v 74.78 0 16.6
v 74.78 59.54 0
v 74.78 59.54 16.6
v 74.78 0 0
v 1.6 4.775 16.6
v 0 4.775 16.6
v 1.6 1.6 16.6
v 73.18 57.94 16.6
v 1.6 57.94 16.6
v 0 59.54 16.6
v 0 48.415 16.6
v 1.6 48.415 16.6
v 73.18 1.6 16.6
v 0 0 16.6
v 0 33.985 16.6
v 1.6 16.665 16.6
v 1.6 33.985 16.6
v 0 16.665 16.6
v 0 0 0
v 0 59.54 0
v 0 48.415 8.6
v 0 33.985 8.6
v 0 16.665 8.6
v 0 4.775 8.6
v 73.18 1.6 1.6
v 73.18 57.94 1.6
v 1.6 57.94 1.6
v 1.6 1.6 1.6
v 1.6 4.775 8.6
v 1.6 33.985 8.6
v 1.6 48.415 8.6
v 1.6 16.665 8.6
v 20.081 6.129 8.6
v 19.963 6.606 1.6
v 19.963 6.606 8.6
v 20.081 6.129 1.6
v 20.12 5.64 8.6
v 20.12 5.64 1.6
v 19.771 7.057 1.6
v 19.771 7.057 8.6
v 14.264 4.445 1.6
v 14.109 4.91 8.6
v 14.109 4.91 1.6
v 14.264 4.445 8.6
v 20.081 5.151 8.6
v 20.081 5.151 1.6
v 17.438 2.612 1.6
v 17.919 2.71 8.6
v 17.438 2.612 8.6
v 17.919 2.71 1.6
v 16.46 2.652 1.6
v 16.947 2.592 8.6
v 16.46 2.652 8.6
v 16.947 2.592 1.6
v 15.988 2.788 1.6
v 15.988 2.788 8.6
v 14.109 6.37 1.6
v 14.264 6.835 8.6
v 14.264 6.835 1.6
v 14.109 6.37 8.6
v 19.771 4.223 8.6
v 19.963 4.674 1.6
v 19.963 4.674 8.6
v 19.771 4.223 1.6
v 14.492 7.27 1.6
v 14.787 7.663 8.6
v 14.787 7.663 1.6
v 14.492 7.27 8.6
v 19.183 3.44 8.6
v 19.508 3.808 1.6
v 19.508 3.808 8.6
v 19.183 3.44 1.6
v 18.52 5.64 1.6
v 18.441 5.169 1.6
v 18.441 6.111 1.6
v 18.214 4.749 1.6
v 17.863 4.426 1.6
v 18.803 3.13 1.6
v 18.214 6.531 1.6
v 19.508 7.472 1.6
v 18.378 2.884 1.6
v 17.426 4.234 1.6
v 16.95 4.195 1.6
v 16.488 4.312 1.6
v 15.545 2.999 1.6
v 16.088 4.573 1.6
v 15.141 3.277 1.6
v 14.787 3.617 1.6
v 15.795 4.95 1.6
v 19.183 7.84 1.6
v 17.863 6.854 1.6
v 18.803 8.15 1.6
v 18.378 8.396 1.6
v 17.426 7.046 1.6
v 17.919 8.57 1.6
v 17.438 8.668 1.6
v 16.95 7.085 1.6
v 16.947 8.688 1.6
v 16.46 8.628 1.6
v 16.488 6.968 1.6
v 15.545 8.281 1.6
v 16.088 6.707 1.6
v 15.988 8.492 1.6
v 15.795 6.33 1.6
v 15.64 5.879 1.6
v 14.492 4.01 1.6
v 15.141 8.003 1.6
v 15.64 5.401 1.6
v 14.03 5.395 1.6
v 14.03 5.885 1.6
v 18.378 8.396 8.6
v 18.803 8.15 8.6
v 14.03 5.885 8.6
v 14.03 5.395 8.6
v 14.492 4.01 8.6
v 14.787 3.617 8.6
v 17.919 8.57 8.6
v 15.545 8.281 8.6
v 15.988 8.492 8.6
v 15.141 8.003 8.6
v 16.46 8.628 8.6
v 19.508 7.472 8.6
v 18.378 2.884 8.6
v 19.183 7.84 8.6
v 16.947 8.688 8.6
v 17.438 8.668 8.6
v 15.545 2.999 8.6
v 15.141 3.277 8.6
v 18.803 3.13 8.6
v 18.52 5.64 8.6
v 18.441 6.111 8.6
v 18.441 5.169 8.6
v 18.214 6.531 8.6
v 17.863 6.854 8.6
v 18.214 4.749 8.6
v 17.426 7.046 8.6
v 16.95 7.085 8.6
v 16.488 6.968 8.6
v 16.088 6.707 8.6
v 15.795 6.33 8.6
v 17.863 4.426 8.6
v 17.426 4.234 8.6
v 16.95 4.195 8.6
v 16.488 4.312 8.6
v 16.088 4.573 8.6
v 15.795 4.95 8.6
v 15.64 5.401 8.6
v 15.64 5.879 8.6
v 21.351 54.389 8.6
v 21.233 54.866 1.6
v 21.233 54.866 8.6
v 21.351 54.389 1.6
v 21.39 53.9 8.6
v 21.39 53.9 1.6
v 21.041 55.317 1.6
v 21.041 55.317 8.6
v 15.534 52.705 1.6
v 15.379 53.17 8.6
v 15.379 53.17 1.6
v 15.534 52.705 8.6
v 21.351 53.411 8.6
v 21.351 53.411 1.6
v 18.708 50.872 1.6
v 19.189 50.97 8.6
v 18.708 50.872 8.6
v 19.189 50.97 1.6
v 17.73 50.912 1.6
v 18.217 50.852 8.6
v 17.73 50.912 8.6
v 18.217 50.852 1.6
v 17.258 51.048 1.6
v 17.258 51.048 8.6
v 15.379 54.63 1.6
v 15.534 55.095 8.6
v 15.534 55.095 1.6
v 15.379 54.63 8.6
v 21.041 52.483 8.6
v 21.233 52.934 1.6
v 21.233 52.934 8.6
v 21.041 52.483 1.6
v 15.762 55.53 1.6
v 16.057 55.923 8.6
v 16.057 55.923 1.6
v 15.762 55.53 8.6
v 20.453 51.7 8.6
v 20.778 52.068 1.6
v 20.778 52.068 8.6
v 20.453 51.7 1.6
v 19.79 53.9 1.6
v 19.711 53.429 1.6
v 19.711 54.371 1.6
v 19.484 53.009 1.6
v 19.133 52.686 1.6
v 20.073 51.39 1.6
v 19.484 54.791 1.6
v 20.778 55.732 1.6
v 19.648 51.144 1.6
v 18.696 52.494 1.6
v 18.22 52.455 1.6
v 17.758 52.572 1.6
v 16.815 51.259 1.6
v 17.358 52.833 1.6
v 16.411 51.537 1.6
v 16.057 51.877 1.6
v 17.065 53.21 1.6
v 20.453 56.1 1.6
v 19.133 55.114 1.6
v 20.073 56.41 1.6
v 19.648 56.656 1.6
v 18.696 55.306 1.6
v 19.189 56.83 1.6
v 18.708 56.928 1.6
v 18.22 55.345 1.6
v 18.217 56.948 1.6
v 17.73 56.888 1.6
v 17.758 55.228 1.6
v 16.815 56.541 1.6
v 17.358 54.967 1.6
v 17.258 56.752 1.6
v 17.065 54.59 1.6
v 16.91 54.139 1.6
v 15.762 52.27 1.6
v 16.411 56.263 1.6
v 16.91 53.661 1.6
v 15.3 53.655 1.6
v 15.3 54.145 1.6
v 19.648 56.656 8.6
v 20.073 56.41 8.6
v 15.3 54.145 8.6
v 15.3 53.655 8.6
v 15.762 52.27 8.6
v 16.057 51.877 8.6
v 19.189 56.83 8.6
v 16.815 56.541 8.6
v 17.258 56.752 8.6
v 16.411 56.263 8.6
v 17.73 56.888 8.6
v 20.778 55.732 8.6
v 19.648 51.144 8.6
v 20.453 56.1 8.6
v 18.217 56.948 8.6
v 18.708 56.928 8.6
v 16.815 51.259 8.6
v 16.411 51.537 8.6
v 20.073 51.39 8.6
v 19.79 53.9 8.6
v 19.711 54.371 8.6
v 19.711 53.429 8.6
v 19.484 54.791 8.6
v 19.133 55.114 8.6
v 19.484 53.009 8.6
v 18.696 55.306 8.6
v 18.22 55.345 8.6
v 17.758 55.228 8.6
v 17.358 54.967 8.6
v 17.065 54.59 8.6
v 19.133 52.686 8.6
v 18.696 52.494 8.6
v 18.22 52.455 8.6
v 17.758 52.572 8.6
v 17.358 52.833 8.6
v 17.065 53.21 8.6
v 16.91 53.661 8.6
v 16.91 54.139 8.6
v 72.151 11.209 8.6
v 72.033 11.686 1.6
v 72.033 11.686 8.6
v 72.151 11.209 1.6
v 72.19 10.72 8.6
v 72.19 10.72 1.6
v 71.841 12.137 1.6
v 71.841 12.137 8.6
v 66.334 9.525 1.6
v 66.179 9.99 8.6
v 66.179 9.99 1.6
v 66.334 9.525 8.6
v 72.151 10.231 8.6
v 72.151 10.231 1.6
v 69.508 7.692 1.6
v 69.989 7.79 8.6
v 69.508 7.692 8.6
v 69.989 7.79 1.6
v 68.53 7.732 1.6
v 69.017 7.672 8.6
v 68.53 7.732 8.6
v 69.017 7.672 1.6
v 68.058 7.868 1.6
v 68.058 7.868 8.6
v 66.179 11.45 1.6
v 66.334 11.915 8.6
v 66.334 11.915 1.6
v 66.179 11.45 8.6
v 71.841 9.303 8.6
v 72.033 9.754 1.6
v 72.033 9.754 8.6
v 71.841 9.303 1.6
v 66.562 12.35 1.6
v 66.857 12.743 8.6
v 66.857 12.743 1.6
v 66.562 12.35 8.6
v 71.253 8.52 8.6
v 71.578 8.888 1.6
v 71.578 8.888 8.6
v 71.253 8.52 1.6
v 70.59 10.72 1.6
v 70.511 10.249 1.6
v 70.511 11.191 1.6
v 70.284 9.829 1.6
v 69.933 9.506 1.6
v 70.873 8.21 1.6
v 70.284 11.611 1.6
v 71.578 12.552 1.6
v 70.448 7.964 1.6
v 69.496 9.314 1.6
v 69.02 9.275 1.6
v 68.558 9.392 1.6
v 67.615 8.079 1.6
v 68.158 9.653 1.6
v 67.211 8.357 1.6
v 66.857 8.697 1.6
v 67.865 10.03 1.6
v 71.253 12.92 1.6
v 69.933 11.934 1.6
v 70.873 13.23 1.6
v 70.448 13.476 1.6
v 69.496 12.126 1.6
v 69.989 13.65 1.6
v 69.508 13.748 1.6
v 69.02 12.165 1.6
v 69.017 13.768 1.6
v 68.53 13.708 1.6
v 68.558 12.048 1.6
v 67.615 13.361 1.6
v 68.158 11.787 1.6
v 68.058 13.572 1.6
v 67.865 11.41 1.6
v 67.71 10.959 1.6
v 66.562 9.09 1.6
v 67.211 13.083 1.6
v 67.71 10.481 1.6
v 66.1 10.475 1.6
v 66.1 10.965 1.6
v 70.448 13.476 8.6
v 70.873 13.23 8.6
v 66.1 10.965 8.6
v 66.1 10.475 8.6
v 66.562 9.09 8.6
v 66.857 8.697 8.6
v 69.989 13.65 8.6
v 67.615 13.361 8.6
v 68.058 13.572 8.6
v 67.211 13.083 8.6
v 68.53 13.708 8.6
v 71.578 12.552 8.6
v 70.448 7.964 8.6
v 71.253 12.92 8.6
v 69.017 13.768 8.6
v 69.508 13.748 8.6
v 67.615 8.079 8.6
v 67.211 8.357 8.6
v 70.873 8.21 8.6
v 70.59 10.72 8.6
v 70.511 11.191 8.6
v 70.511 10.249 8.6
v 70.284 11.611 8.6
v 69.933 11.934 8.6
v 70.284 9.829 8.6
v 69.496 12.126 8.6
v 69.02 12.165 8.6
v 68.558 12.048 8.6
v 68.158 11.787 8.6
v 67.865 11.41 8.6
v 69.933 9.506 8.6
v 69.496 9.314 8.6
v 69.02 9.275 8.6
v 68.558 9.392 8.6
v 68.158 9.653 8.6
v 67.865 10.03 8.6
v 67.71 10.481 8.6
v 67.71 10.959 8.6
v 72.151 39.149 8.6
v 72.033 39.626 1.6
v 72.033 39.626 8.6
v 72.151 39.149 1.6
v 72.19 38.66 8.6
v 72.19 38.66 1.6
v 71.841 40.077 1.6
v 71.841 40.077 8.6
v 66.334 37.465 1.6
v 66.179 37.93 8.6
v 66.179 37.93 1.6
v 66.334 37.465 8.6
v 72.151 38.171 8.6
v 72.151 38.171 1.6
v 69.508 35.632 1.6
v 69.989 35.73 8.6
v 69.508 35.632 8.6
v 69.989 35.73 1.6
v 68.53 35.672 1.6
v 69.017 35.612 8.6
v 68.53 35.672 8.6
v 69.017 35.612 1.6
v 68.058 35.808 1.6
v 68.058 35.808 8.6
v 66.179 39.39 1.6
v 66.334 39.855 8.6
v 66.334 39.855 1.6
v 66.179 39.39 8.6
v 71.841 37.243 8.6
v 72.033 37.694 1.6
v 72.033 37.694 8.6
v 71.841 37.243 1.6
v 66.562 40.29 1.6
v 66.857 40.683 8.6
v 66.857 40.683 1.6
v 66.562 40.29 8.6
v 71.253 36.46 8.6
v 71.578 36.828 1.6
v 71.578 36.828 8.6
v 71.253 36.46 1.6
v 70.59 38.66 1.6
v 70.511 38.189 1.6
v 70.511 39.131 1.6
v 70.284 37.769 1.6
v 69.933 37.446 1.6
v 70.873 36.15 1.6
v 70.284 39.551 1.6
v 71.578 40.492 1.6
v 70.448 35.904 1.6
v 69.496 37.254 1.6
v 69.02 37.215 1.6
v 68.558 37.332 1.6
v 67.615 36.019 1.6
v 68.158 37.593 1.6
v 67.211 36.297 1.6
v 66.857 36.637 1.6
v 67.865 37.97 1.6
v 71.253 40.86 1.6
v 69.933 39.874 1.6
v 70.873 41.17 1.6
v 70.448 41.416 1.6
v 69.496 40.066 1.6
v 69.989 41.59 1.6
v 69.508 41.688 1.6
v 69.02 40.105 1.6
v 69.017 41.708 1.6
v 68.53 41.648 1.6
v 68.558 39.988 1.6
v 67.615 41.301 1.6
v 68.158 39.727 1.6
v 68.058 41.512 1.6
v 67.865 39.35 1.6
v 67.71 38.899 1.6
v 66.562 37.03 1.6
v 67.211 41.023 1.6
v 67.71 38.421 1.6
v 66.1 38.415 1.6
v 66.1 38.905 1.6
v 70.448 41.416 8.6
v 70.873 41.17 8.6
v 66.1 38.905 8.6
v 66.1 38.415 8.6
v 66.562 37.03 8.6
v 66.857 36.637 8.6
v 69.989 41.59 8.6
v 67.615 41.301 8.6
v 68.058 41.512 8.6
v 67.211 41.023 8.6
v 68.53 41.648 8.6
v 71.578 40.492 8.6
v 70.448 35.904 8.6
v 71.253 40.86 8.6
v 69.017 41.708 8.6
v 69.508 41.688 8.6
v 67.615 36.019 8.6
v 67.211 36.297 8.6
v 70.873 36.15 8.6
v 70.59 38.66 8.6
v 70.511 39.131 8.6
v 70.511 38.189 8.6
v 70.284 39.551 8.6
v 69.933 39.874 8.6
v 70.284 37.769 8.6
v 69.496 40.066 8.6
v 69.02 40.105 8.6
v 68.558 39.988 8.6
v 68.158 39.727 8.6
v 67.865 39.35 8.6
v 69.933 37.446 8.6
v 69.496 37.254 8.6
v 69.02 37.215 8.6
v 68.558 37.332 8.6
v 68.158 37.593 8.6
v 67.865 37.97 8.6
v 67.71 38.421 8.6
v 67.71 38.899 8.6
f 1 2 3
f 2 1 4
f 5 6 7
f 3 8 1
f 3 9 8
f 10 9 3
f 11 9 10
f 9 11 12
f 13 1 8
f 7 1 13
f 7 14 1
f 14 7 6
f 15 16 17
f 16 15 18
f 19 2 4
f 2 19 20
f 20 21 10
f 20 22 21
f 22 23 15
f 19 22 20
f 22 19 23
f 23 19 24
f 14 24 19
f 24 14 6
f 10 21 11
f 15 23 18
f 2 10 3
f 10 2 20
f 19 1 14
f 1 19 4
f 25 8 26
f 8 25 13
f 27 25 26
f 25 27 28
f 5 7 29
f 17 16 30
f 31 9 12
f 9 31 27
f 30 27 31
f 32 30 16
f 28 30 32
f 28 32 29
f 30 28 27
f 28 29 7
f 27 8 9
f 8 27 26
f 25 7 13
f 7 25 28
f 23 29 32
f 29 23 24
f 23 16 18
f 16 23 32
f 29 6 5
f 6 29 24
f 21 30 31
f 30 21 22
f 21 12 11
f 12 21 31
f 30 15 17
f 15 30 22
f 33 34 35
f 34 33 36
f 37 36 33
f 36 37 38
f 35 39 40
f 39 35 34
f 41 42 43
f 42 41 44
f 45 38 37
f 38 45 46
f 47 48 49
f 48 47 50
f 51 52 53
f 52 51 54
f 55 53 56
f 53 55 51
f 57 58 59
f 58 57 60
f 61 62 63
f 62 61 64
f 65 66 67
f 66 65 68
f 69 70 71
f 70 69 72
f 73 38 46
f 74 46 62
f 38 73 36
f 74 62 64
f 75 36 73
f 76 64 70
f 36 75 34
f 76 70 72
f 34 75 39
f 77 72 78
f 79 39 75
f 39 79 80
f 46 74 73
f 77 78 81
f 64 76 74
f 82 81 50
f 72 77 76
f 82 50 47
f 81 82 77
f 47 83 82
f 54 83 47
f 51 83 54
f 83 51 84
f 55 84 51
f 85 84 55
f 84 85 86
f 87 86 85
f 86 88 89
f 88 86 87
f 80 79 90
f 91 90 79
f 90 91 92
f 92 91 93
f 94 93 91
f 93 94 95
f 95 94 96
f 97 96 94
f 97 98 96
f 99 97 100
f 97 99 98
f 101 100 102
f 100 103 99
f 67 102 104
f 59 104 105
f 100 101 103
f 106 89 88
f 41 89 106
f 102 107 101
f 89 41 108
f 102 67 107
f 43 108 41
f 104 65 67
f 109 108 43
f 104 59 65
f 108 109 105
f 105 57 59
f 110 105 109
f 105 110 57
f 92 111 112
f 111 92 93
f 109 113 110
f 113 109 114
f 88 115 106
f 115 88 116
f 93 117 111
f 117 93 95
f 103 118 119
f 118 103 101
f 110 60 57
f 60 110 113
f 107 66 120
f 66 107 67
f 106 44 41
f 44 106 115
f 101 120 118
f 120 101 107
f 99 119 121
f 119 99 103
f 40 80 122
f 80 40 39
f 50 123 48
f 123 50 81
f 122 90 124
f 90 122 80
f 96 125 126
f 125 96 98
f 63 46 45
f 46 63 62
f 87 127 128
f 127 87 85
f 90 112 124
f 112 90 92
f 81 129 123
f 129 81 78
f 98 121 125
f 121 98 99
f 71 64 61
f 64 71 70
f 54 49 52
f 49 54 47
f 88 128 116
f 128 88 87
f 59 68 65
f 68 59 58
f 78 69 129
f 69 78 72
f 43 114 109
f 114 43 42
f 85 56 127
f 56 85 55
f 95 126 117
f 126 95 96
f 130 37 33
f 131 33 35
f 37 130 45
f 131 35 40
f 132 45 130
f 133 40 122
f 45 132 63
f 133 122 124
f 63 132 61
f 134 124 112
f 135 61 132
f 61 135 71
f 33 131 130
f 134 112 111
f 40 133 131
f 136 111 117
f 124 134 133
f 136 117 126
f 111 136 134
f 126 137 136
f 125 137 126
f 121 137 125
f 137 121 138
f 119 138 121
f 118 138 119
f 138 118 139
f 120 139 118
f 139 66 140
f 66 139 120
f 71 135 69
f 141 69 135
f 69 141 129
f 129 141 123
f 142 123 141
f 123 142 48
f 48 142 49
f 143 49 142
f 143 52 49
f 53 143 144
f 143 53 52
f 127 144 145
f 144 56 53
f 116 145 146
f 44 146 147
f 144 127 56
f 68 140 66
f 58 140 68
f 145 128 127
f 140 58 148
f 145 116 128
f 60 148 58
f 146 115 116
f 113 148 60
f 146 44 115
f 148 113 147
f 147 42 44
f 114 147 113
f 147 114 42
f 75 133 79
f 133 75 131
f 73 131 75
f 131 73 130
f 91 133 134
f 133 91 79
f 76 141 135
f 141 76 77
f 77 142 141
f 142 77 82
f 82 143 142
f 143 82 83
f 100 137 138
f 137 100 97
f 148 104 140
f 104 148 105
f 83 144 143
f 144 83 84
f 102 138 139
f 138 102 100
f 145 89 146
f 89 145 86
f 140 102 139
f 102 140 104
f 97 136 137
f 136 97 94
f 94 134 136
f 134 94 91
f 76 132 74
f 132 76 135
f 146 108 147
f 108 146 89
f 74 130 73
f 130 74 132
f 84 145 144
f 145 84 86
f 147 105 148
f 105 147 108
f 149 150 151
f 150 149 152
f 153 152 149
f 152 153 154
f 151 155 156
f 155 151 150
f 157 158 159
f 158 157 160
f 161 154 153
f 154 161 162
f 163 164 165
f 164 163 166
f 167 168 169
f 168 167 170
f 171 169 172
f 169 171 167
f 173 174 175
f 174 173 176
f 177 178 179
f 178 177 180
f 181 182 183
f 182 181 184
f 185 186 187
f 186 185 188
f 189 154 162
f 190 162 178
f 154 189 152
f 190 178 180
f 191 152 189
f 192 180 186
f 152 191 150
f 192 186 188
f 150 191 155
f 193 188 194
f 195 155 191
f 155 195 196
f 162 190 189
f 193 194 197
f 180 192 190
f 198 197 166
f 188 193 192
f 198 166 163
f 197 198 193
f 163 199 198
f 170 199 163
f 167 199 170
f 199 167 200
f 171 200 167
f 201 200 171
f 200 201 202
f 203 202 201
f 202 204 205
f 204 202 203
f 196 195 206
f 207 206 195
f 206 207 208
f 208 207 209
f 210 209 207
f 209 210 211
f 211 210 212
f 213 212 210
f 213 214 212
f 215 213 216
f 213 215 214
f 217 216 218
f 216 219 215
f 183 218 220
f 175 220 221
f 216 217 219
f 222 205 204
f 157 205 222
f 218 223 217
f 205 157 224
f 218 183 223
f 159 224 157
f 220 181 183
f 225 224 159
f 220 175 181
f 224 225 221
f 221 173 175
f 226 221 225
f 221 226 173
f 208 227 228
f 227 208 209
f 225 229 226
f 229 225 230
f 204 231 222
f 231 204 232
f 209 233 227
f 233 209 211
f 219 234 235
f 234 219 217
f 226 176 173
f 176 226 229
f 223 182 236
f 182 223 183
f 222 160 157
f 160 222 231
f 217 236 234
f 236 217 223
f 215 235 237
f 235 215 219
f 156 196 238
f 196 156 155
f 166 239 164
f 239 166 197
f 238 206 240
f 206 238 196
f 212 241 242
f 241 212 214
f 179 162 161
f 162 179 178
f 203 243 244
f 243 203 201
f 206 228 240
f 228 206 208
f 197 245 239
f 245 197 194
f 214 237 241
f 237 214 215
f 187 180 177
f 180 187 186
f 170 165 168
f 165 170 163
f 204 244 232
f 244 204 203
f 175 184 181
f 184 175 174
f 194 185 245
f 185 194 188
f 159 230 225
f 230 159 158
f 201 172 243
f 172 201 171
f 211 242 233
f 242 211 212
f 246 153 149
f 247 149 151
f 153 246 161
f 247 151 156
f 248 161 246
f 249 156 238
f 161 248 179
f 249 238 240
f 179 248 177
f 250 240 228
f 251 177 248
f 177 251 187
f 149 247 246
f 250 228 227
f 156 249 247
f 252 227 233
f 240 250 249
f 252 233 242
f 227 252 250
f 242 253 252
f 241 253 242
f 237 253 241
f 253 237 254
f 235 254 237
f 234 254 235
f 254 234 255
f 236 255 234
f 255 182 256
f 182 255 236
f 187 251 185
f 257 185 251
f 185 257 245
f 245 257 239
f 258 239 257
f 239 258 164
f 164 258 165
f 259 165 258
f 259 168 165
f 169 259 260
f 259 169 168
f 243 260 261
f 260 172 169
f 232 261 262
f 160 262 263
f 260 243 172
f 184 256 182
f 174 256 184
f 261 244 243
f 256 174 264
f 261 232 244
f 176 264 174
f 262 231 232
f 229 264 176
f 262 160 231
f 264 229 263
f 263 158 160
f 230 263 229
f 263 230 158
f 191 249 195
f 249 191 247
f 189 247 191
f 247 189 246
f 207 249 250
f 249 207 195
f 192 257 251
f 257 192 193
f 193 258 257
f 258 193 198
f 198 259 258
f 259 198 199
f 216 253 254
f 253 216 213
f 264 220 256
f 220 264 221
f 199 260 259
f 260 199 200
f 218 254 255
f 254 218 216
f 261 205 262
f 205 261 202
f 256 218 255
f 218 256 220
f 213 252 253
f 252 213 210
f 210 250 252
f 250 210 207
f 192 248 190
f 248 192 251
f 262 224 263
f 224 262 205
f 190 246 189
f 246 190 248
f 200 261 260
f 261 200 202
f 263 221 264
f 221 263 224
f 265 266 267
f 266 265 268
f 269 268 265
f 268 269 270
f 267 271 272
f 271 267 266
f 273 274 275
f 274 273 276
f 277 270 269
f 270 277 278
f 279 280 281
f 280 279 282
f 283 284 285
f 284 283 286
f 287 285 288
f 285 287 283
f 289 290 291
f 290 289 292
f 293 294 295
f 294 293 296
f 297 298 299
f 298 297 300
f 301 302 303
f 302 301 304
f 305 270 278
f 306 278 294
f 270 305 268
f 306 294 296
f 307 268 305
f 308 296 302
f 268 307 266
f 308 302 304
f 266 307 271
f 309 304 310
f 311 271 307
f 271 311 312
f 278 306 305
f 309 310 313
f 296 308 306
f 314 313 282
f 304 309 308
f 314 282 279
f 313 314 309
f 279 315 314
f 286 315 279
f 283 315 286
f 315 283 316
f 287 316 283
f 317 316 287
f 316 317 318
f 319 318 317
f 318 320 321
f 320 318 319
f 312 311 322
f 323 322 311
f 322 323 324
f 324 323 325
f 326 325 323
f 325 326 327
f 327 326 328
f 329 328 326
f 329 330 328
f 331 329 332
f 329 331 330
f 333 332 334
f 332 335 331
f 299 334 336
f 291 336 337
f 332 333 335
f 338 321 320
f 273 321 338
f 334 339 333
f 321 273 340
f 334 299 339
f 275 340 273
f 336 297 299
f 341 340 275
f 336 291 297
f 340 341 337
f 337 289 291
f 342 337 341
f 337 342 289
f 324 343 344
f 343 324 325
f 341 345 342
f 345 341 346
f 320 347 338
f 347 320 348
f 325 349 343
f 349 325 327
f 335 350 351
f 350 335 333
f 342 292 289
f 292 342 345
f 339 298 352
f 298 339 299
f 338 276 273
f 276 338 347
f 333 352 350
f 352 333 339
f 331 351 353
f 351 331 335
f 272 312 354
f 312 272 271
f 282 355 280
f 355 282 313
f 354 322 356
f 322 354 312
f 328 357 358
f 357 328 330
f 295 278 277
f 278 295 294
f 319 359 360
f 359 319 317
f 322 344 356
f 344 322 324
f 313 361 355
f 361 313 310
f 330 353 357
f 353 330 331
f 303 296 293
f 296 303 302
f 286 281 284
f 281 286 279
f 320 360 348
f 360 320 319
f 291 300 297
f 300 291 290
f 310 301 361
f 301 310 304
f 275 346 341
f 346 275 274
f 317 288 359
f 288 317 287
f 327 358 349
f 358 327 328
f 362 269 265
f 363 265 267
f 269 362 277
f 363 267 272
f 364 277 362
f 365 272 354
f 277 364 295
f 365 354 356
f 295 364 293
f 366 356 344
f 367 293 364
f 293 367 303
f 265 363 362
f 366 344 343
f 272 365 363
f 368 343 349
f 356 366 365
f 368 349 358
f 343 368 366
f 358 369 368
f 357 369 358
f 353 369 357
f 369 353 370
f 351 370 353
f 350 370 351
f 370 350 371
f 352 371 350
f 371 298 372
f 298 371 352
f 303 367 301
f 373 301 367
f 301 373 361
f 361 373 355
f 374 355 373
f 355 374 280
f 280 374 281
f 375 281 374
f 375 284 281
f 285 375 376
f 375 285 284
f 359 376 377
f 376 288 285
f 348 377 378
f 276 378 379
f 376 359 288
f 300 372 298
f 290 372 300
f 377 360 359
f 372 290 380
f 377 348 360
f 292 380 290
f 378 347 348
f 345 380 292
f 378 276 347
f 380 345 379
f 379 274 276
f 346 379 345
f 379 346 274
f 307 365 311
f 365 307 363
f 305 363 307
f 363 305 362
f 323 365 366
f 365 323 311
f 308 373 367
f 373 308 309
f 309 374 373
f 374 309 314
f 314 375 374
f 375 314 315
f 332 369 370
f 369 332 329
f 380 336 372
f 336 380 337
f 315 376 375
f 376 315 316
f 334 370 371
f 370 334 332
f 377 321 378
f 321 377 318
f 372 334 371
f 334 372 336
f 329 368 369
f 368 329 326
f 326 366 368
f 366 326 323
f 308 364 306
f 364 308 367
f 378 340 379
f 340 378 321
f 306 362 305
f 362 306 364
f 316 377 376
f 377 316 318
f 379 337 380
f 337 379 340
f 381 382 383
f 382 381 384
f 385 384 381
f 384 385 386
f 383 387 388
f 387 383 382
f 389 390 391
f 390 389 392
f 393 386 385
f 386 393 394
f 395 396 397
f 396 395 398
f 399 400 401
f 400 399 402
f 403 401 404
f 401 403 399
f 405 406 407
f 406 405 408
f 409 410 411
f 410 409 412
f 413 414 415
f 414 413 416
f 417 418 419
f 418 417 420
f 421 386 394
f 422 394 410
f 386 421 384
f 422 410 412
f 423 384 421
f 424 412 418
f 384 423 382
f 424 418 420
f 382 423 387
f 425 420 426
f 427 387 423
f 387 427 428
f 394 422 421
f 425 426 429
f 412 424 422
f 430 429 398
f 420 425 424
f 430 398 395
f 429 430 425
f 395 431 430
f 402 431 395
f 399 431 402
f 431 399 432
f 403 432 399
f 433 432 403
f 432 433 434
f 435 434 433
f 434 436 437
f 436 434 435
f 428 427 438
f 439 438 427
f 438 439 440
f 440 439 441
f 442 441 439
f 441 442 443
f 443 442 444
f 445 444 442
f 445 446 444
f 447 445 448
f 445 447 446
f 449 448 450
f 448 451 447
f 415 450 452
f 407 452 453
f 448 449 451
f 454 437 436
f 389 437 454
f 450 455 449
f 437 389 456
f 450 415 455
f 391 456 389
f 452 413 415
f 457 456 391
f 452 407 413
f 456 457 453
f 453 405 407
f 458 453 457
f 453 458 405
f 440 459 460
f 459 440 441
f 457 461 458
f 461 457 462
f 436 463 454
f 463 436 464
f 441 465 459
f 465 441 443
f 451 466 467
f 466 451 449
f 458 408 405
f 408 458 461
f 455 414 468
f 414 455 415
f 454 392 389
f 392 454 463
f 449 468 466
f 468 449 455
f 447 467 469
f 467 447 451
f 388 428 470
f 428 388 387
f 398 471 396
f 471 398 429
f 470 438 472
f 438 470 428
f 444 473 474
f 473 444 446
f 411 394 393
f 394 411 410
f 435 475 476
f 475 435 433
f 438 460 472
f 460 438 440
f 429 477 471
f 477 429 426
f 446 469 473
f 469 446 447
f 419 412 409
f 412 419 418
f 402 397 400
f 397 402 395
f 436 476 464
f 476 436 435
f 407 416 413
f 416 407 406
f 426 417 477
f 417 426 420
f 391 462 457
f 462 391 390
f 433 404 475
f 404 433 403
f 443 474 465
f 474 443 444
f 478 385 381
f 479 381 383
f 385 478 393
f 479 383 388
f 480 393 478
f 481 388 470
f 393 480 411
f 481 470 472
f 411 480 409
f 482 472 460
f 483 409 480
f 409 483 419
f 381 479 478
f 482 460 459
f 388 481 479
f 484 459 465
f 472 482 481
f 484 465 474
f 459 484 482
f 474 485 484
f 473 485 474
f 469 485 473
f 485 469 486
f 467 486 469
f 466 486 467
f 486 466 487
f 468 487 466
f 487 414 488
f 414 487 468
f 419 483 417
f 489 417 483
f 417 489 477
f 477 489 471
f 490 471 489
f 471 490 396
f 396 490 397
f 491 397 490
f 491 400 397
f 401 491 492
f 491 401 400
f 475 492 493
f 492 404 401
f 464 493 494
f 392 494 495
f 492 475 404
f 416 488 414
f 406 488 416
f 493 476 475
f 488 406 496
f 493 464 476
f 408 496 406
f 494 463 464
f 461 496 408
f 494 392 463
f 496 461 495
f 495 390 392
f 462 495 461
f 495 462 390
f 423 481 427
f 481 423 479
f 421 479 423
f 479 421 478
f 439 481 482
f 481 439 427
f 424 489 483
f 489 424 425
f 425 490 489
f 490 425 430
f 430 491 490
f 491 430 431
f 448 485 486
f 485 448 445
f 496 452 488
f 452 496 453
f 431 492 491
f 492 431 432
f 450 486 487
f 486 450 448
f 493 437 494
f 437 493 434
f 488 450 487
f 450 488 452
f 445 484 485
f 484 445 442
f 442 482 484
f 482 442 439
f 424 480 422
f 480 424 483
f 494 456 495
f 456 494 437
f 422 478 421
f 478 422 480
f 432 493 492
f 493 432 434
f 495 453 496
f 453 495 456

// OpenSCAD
// [FL_INDEX: keywords="openscad, 3d_parametric, Customizable_Arduino_Tray, csg_solid" | COT="Parametric OpenSCAD design from 3DCodeverse"]
// Title: Customizable Arduino Tray

//design and code by emanresu (http://www.thingiverse.com/Emanresu)
//generates a simple tray with standoffs for an arduino to sit in


//CUSTOMIZER VARIABLES

//arduino type
arduino_type = "Uno"; //[Uno,Mega]

//thickness of side walls and bottom (mm)
thick = 1.6;
//height of side walls (mm)
wall_height = 15;
//height of standoff (mm)
standoff_height = 7;
//standoff hole diameter (mm)
standoff_hole_diameter = 2.9;
//standoff thickness (mm)
standoff_thick = 1.6;
//clearance between arduino and sidewalls (mm)
clearance = 1.5;


/* [Hidden] */

//sets openSCAD resolution for nice, round holes
$fa=1;
$fs=0.5;


   ///////////////
  //  Modules  //
 ///////////////

module Arduino_standoffs() {
	// body...
	//arranging standoffs
	translate([13.97, 2.54, standoff_height/2]) {
		difference() {
			cylinder(r=standoff_hole_diameter/2+standoff_thick, h=standoff_height, center=true);
			cylinder(r=standoff_hole_diameter/2, h=standoff_height+1, center=true);
		}	
	}
	translate([15.24, 50.8, standoff_height/2]) {
		difference() {
			cylinder(r=standoff_hole_diameter/2+standoff_thick, h=standoff_height, center=true);
			cylinder(r=standoff_hole_diameter/2, h=standoff_height+1, center=true);
		}	
	}
	translate([66.04, 7.62, standoff_height/2]) {
		difference() {
			cylinder(r=standoff_hole_diameter/2+standoff_thick, h=standoff_height, center=true);
			cylinder(r=standoff_hole_diameter/2, h=standoff_height+1, center=true);
		}	
	}
	translate([66.04, 35.56, standoff_height/2]) {
		difference() {
			cylinder(r=standoff_hole_diameter/2+standoff_thick, h=standoff_height, center=true);
			cylinder(r=standoff_hole_diameter/2, h=standoff_height+1, center=true);
		}	
	}
	
	if (arduino_type == "Mega") {
		//adds extra standoffs for Mega, if specified
		translate([90.17, 50.8, standoff_height/2]) {
			difference() {
				cylinder(r=standoff_hole_diameter/2+standoff_thick, h=standoff_height, center=true);
				cylinder(r=standoff_hole_diameter/2, h=standoff_height+1, center=true);
			}	
		}
		translate([96.52, 2.54, standoff_height/2]) {
			difference() {
				cylinder(r=standoff_hole_diameter/2+standoff_thick, h=standoff_height, center=true);
				cylinder(r=standoff_hole_diameter/2, h=standoff_height+1, center=true);
			}	
		}	
	}
}

module Arduino_case_body() {
	// body...
	
	//sets length for type of arduino specified, 101.6 mm for Mega, 68.58 mm for Uno
	base_x = (arduino_type == "Mega" ? 101.6 : 68.58);
	
	difference() {
		cube(size=[base_x+2*thick+2*clearance, 53.34+2*thick+2*clearance, wall_height+thick], center=false);
		translate([thick, thick, thick]) {
			//main compartment
			cube(size=[base_x+2*clearance, 53.34+2*clearance, wall_height+1], center=false);
		}
		translate([thick/2, 7.62+thick+clearance, wall_height/2+thick+standoff_height]) {
			//power plug gap
			cube(size=[thick+1, 8.89+2*clearance, wall_height], center=true);
		}
		translate([thick/2, 38.1+thick+clearance, wall_height/2+thick+standoff_height]) {
			//USB plug gap
			cube(size=[thick+1, 11.43+2*clearance, wall_height], center=true);
		}
	}	
}


   ////////////////////
  //  Control Code  //
 ////////////////////

union() {
	//Joins case body with standoffs
	Arduino_case_body();
	translate([thick+clearance, thick+clearance, thick]) {
		Arduino_standoffs();
	}
}
